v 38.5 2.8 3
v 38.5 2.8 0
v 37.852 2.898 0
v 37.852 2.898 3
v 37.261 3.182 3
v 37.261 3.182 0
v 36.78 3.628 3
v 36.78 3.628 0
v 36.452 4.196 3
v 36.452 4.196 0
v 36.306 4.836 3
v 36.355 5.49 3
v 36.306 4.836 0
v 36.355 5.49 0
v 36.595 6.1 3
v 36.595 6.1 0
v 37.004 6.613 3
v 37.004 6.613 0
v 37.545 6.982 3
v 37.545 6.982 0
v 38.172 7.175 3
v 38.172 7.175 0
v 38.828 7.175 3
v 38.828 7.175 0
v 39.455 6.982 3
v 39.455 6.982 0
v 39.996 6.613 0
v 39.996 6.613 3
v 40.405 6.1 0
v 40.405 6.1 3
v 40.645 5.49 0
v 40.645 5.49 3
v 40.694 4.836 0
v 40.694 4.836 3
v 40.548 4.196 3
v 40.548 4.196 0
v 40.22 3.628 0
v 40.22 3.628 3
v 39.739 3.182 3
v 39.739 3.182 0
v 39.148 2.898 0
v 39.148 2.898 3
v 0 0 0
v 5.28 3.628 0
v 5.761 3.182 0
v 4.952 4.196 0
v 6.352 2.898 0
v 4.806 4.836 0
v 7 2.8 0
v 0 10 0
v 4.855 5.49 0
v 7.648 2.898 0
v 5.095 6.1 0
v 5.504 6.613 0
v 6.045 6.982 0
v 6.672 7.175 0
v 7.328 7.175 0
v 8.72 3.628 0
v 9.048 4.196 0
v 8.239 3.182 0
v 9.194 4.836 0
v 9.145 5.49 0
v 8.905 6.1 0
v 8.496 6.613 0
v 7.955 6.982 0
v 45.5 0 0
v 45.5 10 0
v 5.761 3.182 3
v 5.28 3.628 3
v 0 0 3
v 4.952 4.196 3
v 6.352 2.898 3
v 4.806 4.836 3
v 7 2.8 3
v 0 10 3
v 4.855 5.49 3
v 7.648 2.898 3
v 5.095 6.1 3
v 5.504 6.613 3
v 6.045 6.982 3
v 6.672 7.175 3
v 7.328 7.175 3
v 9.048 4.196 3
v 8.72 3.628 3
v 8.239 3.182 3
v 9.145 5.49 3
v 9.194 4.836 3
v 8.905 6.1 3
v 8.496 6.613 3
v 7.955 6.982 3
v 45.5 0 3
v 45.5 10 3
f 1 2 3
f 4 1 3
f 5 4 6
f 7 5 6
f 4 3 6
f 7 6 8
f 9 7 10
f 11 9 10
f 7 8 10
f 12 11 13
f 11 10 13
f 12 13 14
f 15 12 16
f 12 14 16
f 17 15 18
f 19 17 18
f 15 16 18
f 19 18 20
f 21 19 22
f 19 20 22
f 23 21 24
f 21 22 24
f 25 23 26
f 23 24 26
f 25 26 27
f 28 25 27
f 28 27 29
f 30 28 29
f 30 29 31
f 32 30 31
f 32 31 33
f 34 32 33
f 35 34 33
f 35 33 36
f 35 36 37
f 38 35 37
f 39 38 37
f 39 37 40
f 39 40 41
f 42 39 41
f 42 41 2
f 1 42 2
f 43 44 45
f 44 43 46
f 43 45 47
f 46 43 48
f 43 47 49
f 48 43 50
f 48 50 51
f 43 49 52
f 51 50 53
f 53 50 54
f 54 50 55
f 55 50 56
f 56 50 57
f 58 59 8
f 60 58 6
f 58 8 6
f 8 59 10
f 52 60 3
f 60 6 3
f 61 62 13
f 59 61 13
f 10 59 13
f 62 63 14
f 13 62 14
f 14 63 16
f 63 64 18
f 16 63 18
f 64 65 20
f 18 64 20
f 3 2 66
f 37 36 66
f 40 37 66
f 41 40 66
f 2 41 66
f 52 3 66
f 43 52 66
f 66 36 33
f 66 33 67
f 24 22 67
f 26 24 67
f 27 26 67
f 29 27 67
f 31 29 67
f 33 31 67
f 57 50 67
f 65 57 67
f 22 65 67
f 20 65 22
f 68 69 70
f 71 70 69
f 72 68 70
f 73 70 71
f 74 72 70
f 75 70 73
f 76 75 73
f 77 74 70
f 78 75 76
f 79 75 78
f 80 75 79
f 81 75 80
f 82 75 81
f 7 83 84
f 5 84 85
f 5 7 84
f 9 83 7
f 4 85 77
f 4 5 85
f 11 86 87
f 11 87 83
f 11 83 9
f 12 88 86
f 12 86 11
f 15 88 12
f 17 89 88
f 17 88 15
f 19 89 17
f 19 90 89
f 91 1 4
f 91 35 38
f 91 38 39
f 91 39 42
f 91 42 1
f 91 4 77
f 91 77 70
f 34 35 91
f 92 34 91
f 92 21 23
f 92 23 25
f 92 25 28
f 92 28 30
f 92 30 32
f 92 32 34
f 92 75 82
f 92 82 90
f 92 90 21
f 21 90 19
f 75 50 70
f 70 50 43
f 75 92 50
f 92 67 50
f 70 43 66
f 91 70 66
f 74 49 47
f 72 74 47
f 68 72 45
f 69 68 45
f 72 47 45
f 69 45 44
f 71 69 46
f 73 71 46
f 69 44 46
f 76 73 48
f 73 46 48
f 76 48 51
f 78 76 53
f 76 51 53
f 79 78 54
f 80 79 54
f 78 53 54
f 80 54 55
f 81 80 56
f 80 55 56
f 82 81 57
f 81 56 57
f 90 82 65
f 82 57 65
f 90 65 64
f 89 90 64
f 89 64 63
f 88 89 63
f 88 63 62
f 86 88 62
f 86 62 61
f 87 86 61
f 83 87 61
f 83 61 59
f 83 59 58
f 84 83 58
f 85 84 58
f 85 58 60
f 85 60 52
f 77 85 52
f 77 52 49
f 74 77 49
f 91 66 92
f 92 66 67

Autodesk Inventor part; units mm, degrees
ref_plane "YZ Plane" through (0, 0, 0) normal (1, 0, 0) x (0, 1, 0)
ref_plane "XZ Plane" through (0, 0, 0) normal (0, 1, 0) x (-1, 0, 0)
ref_plane "XY Plane" through (0, 0, 0) normal (0, 0, 1) x (1, 0, 0)
sketch "Sketch1" plane through (0, 0, 0) normal (0, 0, 1) x (1, 0, 0)
  line L0 (0, 0) -> (45.5, 0)
  line L1 (45.5, 0) -> (45.5, 10)
  line L2 (45.5, 10) -> (0, 10)
  line L3 (0, 10) -> (0, 0)
  dimension "d0" = 45.5
  dimension "d1" = 10
extrude "Extrusion1" add sketch "Sketch1" along normal blind 3
sketch "Sketch2" plane through (0, 0, 3) normal (0, 0, 1) x (1, 0, 0)
  line L0 (0, 10) -> (0, 0) projected
  line L1 (45.5, 0) -> (45.5, 10) projected
  line L2 (45.5, 10) -> (0, 10) projected
  point P0 (7, 5)
  point P1 (38.5, 5)
  dimension "d4" = 7
  dimension "d5" = 7
  dimension "d6" = 5
  dimension "d7" = 5
sketch "Sketch3" plane through (0, 0, 3) normal (0, 0, 1) x (1, 0, 0)
  point P0 (0, 0)
hole "Hole1" at (7, 5, 3) at (38.5, 5, 3) direction (0, 0, -1) diameter 4.4 end through all
properties part number "pipeServo"
